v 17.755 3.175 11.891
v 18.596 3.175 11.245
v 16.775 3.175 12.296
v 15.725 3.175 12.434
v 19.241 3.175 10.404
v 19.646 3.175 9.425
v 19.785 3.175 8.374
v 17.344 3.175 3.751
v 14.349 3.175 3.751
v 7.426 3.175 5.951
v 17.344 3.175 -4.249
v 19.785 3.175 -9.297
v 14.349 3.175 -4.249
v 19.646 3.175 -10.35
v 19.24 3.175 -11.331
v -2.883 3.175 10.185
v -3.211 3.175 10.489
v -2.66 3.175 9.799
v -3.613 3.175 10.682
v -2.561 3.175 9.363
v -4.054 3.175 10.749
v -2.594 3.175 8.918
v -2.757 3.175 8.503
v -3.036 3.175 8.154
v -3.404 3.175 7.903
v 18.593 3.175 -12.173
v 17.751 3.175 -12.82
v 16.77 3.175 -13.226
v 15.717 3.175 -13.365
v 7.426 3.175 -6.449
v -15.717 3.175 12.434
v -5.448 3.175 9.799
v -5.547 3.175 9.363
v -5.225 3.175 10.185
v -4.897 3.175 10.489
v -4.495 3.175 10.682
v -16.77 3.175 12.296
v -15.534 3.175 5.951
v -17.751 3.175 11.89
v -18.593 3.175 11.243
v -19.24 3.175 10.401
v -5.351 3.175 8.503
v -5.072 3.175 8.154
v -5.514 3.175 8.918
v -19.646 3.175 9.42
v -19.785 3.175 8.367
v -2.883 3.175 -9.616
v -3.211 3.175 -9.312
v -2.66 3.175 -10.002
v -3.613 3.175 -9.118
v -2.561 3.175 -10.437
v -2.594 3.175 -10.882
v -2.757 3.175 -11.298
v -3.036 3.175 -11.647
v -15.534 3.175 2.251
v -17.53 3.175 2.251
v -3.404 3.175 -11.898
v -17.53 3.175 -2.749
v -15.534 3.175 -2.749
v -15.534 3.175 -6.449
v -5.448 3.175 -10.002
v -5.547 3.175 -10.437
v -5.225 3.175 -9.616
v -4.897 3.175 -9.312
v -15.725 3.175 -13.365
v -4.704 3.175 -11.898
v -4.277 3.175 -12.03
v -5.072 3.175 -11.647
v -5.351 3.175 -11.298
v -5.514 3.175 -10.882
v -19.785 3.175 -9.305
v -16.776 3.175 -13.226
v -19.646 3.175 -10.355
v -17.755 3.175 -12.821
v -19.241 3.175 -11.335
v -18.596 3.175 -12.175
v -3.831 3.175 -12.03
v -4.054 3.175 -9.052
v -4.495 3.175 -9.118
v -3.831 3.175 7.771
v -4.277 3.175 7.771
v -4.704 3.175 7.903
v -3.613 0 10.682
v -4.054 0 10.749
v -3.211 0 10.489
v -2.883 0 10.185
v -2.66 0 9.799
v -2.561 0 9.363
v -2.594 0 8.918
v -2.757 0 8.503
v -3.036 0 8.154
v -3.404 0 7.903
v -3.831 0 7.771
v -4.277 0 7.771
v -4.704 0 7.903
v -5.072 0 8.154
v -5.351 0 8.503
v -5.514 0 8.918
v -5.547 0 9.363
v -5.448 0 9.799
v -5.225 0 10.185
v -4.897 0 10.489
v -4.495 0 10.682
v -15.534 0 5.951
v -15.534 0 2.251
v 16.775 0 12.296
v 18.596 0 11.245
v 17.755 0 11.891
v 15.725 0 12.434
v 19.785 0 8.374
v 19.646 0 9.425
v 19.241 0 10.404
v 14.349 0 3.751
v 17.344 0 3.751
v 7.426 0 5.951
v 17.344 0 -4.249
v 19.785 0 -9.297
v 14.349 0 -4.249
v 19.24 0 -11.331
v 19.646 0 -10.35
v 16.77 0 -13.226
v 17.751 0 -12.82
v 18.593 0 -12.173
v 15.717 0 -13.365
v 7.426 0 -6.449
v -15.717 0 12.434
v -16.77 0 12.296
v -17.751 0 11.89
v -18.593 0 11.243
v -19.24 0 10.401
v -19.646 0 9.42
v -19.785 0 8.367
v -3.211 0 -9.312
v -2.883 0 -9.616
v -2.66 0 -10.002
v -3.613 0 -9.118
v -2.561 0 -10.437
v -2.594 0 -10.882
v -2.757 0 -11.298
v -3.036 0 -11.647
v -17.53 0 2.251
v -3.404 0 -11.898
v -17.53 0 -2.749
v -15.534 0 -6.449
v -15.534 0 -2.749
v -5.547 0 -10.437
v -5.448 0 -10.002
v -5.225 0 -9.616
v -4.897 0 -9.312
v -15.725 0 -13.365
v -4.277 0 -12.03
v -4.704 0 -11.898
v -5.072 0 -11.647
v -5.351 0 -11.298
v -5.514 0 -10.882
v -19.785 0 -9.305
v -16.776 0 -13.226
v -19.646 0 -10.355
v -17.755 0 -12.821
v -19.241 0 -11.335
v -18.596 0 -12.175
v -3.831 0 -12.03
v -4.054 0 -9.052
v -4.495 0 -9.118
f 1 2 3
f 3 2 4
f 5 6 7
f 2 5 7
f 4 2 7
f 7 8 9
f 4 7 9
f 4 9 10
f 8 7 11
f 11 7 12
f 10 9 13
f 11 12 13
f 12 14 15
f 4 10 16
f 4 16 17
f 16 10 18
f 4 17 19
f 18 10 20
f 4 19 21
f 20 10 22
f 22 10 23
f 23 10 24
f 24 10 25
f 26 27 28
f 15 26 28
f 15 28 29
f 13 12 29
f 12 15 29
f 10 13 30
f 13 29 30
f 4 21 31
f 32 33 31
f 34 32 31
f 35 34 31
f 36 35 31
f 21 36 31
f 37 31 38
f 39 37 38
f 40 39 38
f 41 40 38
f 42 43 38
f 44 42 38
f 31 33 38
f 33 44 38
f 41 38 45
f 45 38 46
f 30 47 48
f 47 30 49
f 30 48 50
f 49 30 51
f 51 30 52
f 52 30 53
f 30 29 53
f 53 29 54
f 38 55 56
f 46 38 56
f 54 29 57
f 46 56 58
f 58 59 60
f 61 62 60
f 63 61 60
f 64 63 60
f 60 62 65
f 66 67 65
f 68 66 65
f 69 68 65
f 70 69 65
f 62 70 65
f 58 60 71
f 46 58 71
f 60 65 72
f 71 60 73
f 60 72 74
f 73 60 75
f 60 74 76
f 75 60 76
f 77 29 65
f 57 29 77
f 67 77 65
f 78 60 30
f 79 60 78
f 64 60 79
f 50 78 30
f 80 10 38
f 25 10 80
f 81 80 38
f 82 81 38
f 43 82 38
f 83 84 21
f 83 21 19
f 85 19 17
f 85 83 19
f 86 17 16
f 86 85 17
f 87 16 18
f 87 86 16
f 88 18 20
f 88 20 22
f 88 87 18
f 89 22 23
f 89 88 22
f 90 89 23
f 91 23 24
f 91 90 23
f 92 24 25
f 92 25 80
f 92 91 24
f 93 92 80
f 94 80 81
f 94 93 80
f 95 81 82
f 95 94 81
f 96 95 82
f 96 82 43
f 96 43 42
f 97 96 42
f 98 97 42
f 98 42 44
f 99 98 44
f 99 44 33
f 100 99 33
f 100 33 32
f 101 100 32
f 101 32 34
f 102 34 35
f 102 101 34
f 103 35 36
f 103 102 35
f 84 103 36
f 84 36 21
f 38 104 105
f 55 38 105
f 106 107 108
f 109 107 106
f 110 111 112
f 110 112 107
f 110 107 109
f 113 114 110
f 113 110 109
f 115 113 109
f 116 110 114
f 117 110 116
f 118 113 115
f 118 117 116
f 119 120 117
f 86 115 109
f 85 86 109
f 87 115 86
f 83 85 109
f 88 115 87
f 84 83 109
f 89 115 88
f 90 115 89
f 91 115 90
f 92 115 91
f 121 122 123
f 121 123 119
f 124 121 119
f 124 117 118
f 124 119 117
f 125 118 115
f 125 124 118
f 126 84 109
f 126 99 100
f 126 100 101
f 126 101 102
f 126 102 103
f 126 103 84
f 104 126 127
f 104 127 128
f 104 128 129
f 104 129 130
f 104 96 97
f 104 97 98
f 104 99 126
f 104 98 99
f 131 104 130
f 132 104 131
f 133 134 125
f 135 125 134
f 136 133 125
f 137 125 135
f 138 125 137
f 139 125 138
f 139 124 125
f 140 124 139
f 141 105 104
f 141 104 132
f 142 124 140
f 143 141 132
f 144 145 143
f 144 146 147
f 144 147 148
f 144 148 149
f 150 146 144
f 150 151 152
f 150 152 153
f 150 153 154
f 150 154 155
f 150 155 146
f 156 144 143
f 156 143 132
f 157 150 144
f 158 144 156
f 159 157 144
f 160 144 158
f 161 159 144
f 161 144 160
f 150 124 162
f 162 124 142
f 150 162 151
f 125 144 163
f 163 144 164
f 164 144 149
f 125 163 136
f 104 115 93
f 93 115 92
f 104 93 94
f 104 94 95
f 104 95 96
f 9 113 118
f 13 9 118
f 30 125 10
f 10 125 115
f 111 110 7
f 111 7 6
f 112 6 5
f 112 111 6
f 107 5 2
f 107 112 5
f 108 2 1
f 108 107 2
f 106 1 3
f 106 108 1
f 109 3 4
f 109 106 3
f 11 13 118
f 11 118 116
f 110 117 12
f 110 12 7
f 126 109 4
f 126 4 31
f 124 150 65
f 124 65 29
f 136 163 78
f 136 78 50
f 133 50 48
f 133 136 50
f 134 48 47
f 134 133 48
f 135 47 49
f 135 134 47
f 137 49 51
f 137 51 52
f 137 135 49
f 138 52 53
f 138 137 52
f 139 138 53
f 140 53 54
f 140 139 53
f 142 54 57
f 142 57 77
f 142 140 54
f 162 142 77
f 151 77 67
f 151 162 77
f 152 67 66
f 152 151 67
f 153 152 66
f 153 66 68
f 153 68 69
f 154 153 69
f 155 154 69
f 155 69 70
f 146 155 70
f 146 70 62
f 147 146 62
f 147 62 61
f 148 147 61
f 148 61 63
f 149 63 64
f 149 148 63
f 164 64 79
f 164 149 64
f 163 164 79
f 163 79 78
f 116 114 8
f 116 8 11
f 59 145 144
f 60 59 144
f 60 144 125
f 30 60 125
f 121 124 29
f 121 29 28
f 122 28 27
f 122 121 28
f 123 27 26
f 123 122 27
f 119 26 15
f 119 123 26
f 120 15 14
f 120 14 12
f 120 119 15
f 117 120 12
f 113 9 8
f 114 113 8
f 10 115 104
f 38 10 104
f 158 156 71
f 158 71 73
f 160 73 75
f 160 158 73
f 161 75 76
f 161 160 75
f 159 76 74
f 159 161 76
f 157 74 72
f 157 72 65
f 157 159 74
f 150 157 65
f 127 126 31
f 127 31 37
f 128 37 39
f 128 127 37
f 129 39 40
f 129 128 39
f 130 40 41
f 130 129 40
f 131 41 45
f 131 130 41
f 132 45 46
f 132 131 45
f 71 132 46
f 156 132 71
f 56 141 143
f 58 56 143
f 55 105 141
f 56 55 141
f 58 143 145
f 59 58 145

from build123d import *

# Parameters (mm, degrees)
SKETCH1_R           = 1.4972665
SKETCH1_W           = 2.994723397
SKETCH1_H           = 8.000362859
BOSS_EXTRUDE1_DEPTH = 3.175


with BuildPart() as part:
    # Sketch1 → Boss-Extrude1 (new body)
    with BuildSketch(Plane(origin=(0, 0, 0), x_dir=(1, 0, 0), z_dir=(0, 1, 0))):
        with BuildLine():
            Line((-15.724689345, 13.36466939), (15.717340342, 13.36466939))
            ThreePointArc((15.717340342, 13.36466939), (18.593486483, 12.173330652), (19.784825221, 9.297184512))
            Line((19.784825221, 9.297184512), (19.784825221, -8.374175229))
            ThreePointArc((19.784825221, -8.374175229), (18.595583797, -11.245258003), (15.724501023, -12.434499427))
            Line((15.724501023, -12.434499427), (-15.717328779, -12.434499427))
            ThreePointArc((-15.717328779, -12.434499427), (-18.593478625, -11.243159154), (-19.784818899, -8.367009308))
            Line((-19.784818899, -8.367009308), (-19.784818899, 9.304539837))
            ThreePointArc((-19.784818899, 9.304539837), (-18.595634485, 12.175484977), (-15.724689345, 13.36466939))
        make_face()
        with Locations(Location((-4.054054374, 10.549054746, 0), (0, 0, 270))):
            Circle(SKETCH1_R, mode=Mode.SUBTRACT)
        with Locations(Location((-4.054054375, -9.251582203, 0), (0, 0, 270))):
            Circle(SKETCH1_R, mode=Mode.SUBTRACT)
        Polygon((-15.533671416, 6.449054402), (7.425689399, 6.449054402), (7.425689399, -5.951480927), (-15.533671416, -5.951480927), (-15.533671416, -2.251386169), (-17.530124434, -2.251386169), (-17.530124434, 2.748832682), (-15.533671416, 2.748832682), align=None, mode=Mode.SUBTRACT)
        with Locations((15.846212781, 0.248720813)):
            Rectangle(SKETCH1_W, SKETCH1_H, mode=Mode.SUBTRACT)
    extrude(amount=BOSS_EXTRUDE1_DEPTH)


solid = part.part
